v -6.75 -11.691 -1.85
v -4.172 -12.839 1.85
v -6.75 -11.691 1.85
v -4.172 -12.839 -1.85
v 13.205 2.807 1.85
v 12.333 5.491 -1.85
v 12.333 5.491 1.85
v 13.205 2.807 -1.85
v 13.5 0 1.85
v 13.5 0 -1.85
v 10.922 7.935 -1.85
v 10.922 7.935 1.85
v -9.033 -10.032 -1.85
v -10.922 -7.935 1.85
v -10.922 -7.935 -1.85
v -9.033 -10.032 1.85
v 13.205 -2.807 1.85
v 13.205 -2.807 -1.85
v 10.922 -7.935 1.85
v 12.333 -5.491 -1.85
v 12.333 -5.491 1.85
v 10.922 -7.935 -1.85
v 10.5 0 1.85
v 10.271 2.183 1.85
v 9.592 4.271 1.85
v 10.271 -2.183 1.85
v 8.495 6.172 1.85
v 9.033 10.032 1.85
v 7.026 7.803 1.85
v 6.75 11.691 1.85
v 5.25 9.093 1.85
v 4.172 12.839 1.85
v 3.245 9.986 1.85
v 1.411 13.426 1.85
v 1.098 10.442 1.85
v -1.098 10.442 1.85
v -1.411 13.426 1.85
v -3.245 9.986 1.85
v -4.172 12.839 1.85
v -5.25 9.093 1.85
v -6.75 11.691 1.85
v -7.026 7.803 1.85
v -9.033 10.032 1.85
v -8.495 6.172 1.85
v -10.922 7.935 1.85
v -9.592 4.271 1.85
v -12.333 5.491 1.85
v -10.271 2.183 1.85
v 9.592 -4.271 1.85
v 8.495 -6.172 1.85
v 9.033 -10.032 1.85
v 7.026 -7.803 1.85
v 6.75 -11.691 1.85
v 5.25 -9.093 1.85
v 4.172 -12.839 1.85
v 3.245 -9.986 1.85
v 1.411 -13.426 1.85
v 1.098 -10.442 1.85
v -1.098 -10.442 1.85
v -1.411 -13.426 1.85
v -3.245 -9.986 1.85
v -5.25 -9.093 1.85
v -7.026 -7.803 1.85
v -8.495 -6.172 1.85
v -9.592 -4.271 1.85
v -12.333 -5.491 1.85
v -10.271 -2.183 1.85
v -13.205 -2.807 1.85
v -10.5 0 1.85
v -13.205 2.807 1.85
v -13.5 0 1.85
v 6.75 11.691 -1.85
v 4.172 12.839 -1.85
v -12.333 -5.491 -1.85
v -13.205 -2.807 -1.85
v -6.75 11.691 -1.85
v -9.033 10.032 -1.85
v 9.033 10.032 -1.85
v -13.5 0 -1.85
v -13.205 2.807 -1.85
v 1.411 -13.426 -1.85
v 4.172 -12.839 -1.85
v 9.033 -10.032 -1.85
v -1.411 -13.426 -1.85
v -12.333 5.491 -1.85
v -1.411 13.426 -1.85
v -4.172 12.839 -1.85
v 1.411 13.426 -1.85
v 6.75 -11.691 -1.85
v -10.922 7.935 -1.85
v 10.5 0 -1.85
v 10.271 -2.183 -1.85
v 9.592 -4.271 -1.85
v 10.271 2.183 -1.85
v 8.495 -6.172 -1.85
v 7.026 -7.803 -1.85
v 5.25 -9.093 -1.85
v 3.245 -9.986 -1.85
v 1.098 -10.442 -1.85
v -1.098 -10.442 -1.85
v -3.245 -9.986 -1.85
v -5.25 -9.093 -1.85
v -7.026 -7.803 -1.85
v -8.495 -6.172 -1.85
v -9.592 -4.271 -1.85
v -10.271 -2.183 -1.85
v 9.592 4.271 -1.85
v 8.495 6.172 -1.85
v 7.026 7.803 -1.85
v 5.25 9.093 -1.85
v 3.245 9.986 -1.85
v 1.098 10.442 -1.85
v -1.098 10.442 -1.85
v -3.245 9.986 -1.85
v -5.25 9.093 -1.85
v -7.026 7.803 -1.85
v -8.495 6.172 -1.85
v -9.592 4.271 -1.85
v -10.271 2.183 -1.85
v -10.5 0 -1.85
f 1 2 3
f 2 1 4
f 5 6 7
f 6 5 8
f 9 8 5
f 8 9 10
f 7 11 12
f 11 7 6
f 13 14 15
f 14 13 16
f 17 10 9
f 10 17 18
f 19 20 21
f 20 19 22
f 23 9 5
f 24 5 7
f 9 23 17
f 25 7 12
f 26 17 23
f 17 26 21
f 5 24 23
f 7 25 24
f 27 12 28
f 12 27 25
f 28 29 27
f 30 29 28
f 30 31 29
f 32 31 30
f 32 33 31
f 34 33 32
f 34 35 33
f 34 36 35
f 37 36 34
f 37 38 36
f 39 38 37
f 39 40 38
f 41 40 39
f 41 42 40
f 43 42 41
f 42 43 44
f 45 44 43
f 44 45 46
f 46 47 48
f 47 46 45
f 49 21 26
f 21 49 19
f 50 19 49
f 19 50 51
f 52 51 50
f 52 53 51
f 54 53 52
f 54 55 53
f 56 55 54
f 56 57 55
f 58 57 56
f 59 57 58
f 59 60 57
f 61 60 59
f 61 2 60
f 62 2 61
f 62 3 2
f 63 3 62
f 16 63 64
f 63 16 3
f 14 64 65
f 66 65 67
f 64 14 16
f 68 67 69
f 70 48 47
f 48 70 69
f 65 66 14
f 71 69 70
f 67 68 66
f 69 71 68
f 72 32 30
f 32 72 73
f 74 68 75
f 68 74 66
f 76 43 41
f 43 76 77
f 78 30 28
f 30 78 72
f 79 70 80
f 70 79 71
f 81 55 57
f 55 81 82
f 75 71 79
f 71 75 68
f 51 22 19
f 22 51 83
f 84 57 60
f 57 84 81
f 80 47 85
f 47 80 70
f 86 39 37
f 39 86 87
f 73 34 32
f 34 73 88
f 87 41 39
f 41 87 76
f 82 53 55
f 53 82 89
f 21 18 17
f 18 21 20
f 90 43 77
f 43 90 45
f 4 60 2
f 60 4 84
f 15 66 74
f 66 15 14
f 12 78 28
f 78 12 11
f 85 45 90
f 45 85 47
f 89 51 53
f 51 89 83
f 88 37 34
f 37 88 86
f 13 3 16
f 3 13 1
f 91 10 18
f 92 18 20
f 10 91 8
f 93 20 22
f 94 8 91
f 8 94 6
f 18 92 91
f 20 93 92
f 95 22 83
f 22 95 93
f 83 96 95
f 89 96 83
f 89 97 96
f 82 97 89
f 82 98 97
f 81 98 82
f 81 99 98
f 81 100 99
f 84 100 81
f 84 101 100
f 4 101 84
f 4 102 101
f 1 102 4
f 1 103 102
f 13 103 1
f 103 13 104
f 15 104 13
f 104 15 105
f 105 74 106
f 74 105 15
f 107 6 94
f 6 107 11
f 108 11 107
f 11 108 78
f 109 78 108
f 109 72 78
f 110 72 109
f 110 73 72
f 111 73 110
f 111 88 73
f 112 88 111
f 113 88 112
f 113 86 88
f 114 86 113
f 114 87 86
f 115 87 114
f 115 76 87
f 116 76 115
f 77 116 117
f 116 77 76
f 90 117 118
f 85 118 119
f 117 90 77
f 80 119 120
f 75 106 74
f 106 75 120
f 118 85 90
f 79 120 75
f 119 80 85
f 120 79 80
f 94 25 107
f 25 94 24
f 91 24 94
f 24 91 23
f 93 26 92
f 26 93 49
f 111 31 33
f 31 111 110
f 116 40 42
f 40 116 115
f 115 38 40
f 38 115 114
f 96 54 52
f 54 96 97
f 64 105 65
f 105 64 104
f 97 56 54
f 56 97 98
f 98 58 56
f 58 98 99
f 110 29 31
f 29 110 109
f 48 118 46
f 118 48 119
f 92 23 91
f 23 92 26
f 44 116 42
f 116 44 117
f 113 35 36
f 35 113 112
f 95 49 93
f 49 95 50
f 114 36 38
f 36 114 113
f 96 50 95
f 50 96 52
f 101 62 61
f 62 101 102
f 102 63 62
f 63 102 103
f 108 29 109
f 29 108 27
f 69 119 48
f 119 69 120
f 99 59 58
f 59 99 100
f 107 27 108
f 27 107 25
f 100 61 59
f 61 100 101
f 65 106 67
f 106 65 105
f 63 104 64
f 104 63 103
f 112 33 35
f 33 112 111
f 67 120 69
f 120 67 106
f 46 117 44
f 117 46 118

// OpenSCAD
// Parameters
outer_radius = 13.5; //[6.75:27:0.1]
inner_radius = 10.5; //[5.25:21:0.1]
height = 3.7; //[1.85:7.4:0.1]

// Geometry
module radial_ring() {
  difference() {
    // Outer cylinder
    cylinder(r=outer_radius, h=height, center=true);
    
    // Inner cylinder (cut)
    cylinder(r=inner_radius, h=height + 2, center=true);
  }
}

// Final output
color("Silver") radial_ring();
